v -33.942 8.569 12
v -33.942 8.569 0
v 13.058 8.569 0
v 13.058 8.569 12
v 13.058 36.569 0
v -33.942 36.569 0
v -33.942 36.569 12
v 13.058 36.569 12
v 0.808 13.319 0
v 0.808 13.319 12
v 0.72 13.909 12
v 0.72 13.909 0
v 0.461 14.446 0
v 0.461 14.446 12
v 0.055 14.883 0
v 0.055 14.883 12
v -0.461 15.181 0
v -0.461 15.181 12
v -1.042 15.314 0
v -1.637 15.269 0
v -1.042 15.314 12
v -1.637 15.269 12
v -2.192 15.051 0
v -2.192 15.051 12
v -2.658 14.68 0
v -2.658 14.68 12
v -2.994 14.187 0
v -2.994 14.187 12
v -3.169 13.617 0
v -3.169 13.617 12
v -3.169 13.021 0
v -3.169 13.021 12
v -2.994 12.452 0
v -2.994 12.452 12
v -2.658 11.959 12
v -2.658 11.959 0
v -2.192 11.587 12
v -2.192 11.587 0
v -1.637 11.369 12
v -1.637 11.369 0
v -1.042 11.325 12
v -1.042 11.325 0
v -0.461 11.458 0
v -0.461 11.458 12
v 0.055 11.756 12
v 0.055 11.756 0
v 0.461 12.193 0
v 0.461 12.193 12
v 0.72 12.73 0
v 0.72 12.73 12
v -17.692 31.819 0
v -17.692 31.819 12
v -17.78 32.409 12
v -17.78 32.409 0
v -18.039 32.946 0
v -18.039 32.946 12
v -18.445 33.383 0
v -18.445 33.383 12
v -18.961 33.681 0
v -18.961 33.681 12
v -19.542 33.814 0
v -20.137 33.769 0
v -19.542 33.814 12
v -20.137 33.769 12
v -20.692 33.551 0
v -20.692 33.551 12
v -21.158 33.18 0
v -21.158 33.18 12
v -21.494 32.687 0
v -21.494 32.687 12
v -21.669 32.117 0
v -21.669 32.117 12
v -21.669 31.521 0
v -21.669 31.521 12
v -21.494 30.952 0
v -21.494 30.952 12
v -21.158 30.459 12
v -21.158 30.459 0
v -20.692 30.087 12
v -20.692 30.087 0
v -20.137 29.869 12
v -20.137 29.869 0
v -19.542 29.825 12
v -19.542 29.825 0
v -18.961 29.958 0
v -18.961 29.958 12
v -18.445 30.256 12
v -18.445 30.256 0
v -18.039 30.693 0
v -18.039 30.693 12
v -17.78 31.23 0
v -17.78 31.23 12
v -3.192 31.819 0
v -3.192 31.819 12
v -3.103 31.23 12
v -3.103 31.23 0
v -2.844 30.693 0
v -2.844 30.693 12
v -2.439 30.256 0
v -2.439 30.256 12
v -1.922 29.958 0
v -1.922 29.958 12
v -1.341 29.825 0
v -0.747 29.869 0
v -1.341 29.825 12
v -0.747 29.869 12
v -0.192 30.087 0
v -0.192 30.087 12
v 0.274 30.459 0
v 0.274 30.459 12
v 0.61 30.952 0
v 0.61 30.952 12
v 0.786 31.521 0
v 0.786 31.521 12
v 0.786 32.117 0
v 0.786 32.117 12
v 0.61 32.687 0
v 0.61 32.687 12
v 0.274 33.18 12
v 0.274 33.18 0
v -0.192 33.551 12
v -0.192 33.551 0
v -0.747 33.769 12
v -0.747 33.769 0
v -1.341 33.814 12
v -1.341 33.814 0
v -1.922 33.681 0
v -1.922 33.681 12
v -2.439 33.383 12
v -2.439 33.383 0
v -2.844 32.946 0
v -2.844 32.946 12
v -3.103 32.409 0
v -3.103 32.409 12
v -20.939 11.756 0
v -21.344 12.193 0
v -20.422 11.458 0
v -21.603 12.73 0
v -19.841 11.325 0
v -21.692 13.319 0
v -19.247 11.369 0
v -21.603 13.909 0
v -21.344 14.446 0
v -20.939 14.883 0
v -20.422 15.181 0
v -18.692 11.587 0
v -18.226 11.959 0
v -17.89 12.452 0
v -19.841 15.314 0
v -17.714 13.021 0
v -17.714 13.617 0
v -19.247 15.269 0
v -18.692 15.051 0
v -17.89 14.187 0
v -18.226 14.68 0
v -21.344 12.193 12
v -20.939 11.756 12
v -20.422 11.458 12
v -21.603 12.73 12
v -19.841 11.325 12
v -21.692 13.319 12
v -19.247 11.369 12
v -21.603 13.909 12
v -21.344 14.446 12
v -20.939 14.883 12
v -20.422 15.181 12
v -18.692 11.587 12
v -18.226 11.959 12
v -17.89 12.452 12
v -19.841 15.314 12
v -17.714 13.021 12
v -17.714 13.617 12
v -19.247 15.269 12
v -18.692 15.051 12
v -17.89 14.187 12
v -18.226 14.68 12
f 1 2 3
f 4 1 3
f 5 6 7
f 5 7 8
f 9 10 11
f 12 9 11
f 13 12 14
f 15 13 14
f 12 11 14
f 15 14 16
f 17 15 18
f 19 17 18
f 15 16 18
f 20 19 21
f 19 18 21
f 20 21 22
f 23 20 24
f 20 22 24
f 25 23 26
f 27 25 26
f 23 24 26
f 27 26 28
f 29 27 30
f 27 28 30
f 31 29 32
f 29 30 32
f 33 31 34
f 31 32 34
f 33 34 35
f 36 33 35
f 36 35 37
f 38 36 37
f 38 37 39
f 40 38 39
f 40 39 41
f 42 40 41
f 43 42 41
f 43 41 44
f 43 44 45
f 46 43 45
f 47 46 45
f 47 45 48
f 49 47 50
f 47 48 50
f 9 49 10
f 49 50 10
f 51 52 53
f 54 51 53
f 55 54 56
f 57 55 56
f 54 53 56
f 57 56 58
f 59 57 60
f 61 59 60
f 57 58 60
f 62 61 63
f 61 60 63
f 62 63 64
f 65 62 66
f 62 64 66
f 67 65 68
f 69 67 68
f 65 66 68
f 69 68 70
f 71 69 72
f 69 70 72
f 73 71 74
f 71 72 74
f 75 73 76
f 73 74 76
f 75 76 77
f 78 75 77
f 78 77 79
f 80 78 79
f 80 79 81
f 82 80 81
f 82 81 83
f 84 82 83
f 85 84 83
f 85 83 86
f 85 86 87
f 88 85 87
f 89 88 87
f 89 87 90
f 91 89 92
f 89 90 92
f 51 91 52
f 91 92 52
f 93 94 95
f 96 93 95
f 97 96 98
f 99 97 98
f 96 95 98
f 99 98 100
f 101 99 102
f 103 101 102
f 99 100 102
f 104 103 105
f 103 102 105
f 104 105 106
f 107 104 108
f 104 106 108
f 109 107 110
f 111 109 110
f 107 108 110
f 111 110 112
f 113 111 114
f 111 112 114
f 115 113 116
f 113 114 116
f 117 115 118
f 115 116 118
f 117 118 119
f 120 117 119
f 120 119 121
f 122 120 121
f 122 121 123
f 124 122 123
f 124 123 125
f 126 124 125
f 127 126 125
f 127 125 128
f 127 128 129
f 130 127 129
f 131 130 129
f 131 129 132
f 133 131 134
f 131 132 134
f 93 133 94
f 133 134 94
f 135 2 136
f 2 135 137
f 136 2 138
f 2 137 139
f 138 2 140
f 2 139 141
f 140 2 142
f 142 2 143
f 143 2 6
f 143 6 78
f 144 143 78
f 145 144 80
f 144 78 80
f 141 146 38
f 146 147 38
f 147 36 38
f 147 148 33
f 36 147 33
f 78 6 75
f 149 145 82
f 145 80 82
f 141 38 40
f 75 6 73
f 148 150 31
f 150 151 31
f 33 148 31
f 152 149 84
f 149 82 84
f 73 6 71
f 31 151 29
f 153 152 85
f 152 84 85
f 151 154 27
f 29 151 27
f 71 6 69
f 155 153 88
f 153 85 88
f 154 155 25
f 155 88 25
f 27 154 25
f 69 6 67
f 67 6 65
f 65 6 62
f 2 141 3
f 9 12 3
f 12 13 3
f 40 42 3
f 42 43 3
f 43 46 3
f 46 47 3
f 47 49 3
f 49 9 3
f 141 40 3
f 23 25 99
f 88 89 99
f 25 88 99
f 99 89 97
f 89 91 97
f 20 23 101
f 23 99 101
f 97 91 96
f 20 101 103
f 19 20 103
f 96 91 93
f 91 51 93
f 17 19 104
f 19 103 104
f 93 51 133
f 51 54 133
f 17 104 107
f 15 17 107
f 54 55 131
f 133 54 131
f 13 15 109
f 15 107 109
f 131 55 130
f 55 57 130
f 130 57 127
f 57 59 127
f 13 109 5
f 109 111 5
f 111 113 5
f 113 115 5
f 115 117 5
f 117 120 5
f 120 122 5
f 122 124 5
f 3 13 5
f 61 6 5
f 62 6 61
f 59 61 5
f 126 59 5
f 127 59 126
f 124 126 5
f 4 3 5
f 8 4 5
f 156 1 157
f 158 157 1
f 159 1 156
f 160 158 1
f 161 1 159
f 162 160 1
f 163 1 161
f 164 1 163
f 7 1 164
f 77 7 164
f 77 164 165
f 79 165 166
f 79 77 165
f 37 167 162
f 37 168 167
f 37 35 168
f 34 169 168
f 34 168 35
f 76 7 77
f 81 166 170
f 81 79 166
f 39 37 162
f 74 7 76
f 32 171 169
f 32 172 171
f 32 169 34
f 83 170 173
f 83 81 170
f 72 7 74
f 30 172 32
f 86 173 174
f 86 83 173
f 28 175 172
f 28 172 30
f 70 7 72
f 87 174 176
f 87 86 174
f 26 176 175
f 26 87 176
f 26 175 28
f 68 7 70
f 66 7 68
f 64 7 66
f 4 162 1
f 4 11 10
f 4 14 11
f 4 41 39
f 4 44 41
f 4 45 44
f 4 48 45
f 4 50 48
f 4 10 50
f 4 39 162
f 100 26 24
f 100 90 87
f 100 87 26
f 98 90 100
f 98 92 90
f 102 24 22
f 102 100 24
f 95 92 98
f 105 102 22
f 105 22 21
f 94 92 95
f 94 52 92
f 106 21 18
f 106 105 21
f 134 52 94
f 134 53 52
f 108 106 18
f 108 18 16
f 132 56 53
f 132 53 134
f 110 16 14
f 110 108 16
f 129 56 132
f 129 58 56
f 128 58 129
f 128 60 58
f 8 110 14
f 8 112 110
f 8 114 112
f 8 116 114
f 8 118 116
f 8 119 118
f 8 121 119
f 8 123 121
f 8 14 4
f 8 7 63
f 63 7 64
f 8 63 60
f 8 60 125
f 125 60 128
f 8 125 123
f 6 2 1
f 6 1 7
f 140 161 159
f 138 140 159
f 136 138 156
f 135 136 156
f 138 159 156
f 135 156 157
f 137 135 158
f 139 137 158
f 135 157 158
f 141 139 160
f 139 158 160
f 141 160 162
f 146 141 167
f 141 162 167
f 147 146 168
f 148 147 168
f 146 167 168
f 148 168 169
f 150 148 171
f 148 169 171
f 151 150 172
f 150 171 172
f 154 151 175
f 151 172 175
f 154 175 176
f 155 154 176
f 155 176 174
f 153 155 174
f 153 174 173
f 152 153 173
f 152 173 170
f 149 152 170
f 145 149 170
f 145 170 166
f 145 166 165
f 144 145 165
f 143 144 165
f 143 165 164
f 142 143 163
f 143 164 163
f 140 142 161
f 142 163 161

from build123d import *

# Parameters (mm, degrees)
SKETCH_1_W          = 47
SKETCH_1_H          = 28
EXTRUDE_1_DEPTH     = 12
SKETCH_2_R          = 2
CUT_EXTRUDE_1_DEPTH = 12


with BuildPart() as part:
    # 草图1 → 凸台-拉伸1 (new body)
    with BuildSketch(Plane.XY):
        with Locations((-10.441605839, 22.569343066)):
            Rectangle(SKETCH_1_W, SKETCH_1_H)
    extrude(amount=EXTRUDE_1_DEPTH)

    # 草图2 → 切除-拉伸1 (cut)
    with BuildSketch(Plane.XY.offset(12)):
        with Locations((-19.691605839, 31.819343066)):
            Circle(SKETCH_2_R)
        with Locations(Location((-1.191605839, 31.819343066, 0), (0, 0, 180))):
            Circle(SKETCH_2_R)
        with Locations((-1.191605839, 13.319343066)):
            Circle(SKETCH_2_R)
        with Locations(Location((-19.691605839, 13.319343066, 0), (0, 0, 180))):
            Circle(SKETCH_2_R)
    extrude(amount=-CUT_EXTRUDE_1_DEPTH, mode=Mode.SUBTRACT)


solid = part.part
